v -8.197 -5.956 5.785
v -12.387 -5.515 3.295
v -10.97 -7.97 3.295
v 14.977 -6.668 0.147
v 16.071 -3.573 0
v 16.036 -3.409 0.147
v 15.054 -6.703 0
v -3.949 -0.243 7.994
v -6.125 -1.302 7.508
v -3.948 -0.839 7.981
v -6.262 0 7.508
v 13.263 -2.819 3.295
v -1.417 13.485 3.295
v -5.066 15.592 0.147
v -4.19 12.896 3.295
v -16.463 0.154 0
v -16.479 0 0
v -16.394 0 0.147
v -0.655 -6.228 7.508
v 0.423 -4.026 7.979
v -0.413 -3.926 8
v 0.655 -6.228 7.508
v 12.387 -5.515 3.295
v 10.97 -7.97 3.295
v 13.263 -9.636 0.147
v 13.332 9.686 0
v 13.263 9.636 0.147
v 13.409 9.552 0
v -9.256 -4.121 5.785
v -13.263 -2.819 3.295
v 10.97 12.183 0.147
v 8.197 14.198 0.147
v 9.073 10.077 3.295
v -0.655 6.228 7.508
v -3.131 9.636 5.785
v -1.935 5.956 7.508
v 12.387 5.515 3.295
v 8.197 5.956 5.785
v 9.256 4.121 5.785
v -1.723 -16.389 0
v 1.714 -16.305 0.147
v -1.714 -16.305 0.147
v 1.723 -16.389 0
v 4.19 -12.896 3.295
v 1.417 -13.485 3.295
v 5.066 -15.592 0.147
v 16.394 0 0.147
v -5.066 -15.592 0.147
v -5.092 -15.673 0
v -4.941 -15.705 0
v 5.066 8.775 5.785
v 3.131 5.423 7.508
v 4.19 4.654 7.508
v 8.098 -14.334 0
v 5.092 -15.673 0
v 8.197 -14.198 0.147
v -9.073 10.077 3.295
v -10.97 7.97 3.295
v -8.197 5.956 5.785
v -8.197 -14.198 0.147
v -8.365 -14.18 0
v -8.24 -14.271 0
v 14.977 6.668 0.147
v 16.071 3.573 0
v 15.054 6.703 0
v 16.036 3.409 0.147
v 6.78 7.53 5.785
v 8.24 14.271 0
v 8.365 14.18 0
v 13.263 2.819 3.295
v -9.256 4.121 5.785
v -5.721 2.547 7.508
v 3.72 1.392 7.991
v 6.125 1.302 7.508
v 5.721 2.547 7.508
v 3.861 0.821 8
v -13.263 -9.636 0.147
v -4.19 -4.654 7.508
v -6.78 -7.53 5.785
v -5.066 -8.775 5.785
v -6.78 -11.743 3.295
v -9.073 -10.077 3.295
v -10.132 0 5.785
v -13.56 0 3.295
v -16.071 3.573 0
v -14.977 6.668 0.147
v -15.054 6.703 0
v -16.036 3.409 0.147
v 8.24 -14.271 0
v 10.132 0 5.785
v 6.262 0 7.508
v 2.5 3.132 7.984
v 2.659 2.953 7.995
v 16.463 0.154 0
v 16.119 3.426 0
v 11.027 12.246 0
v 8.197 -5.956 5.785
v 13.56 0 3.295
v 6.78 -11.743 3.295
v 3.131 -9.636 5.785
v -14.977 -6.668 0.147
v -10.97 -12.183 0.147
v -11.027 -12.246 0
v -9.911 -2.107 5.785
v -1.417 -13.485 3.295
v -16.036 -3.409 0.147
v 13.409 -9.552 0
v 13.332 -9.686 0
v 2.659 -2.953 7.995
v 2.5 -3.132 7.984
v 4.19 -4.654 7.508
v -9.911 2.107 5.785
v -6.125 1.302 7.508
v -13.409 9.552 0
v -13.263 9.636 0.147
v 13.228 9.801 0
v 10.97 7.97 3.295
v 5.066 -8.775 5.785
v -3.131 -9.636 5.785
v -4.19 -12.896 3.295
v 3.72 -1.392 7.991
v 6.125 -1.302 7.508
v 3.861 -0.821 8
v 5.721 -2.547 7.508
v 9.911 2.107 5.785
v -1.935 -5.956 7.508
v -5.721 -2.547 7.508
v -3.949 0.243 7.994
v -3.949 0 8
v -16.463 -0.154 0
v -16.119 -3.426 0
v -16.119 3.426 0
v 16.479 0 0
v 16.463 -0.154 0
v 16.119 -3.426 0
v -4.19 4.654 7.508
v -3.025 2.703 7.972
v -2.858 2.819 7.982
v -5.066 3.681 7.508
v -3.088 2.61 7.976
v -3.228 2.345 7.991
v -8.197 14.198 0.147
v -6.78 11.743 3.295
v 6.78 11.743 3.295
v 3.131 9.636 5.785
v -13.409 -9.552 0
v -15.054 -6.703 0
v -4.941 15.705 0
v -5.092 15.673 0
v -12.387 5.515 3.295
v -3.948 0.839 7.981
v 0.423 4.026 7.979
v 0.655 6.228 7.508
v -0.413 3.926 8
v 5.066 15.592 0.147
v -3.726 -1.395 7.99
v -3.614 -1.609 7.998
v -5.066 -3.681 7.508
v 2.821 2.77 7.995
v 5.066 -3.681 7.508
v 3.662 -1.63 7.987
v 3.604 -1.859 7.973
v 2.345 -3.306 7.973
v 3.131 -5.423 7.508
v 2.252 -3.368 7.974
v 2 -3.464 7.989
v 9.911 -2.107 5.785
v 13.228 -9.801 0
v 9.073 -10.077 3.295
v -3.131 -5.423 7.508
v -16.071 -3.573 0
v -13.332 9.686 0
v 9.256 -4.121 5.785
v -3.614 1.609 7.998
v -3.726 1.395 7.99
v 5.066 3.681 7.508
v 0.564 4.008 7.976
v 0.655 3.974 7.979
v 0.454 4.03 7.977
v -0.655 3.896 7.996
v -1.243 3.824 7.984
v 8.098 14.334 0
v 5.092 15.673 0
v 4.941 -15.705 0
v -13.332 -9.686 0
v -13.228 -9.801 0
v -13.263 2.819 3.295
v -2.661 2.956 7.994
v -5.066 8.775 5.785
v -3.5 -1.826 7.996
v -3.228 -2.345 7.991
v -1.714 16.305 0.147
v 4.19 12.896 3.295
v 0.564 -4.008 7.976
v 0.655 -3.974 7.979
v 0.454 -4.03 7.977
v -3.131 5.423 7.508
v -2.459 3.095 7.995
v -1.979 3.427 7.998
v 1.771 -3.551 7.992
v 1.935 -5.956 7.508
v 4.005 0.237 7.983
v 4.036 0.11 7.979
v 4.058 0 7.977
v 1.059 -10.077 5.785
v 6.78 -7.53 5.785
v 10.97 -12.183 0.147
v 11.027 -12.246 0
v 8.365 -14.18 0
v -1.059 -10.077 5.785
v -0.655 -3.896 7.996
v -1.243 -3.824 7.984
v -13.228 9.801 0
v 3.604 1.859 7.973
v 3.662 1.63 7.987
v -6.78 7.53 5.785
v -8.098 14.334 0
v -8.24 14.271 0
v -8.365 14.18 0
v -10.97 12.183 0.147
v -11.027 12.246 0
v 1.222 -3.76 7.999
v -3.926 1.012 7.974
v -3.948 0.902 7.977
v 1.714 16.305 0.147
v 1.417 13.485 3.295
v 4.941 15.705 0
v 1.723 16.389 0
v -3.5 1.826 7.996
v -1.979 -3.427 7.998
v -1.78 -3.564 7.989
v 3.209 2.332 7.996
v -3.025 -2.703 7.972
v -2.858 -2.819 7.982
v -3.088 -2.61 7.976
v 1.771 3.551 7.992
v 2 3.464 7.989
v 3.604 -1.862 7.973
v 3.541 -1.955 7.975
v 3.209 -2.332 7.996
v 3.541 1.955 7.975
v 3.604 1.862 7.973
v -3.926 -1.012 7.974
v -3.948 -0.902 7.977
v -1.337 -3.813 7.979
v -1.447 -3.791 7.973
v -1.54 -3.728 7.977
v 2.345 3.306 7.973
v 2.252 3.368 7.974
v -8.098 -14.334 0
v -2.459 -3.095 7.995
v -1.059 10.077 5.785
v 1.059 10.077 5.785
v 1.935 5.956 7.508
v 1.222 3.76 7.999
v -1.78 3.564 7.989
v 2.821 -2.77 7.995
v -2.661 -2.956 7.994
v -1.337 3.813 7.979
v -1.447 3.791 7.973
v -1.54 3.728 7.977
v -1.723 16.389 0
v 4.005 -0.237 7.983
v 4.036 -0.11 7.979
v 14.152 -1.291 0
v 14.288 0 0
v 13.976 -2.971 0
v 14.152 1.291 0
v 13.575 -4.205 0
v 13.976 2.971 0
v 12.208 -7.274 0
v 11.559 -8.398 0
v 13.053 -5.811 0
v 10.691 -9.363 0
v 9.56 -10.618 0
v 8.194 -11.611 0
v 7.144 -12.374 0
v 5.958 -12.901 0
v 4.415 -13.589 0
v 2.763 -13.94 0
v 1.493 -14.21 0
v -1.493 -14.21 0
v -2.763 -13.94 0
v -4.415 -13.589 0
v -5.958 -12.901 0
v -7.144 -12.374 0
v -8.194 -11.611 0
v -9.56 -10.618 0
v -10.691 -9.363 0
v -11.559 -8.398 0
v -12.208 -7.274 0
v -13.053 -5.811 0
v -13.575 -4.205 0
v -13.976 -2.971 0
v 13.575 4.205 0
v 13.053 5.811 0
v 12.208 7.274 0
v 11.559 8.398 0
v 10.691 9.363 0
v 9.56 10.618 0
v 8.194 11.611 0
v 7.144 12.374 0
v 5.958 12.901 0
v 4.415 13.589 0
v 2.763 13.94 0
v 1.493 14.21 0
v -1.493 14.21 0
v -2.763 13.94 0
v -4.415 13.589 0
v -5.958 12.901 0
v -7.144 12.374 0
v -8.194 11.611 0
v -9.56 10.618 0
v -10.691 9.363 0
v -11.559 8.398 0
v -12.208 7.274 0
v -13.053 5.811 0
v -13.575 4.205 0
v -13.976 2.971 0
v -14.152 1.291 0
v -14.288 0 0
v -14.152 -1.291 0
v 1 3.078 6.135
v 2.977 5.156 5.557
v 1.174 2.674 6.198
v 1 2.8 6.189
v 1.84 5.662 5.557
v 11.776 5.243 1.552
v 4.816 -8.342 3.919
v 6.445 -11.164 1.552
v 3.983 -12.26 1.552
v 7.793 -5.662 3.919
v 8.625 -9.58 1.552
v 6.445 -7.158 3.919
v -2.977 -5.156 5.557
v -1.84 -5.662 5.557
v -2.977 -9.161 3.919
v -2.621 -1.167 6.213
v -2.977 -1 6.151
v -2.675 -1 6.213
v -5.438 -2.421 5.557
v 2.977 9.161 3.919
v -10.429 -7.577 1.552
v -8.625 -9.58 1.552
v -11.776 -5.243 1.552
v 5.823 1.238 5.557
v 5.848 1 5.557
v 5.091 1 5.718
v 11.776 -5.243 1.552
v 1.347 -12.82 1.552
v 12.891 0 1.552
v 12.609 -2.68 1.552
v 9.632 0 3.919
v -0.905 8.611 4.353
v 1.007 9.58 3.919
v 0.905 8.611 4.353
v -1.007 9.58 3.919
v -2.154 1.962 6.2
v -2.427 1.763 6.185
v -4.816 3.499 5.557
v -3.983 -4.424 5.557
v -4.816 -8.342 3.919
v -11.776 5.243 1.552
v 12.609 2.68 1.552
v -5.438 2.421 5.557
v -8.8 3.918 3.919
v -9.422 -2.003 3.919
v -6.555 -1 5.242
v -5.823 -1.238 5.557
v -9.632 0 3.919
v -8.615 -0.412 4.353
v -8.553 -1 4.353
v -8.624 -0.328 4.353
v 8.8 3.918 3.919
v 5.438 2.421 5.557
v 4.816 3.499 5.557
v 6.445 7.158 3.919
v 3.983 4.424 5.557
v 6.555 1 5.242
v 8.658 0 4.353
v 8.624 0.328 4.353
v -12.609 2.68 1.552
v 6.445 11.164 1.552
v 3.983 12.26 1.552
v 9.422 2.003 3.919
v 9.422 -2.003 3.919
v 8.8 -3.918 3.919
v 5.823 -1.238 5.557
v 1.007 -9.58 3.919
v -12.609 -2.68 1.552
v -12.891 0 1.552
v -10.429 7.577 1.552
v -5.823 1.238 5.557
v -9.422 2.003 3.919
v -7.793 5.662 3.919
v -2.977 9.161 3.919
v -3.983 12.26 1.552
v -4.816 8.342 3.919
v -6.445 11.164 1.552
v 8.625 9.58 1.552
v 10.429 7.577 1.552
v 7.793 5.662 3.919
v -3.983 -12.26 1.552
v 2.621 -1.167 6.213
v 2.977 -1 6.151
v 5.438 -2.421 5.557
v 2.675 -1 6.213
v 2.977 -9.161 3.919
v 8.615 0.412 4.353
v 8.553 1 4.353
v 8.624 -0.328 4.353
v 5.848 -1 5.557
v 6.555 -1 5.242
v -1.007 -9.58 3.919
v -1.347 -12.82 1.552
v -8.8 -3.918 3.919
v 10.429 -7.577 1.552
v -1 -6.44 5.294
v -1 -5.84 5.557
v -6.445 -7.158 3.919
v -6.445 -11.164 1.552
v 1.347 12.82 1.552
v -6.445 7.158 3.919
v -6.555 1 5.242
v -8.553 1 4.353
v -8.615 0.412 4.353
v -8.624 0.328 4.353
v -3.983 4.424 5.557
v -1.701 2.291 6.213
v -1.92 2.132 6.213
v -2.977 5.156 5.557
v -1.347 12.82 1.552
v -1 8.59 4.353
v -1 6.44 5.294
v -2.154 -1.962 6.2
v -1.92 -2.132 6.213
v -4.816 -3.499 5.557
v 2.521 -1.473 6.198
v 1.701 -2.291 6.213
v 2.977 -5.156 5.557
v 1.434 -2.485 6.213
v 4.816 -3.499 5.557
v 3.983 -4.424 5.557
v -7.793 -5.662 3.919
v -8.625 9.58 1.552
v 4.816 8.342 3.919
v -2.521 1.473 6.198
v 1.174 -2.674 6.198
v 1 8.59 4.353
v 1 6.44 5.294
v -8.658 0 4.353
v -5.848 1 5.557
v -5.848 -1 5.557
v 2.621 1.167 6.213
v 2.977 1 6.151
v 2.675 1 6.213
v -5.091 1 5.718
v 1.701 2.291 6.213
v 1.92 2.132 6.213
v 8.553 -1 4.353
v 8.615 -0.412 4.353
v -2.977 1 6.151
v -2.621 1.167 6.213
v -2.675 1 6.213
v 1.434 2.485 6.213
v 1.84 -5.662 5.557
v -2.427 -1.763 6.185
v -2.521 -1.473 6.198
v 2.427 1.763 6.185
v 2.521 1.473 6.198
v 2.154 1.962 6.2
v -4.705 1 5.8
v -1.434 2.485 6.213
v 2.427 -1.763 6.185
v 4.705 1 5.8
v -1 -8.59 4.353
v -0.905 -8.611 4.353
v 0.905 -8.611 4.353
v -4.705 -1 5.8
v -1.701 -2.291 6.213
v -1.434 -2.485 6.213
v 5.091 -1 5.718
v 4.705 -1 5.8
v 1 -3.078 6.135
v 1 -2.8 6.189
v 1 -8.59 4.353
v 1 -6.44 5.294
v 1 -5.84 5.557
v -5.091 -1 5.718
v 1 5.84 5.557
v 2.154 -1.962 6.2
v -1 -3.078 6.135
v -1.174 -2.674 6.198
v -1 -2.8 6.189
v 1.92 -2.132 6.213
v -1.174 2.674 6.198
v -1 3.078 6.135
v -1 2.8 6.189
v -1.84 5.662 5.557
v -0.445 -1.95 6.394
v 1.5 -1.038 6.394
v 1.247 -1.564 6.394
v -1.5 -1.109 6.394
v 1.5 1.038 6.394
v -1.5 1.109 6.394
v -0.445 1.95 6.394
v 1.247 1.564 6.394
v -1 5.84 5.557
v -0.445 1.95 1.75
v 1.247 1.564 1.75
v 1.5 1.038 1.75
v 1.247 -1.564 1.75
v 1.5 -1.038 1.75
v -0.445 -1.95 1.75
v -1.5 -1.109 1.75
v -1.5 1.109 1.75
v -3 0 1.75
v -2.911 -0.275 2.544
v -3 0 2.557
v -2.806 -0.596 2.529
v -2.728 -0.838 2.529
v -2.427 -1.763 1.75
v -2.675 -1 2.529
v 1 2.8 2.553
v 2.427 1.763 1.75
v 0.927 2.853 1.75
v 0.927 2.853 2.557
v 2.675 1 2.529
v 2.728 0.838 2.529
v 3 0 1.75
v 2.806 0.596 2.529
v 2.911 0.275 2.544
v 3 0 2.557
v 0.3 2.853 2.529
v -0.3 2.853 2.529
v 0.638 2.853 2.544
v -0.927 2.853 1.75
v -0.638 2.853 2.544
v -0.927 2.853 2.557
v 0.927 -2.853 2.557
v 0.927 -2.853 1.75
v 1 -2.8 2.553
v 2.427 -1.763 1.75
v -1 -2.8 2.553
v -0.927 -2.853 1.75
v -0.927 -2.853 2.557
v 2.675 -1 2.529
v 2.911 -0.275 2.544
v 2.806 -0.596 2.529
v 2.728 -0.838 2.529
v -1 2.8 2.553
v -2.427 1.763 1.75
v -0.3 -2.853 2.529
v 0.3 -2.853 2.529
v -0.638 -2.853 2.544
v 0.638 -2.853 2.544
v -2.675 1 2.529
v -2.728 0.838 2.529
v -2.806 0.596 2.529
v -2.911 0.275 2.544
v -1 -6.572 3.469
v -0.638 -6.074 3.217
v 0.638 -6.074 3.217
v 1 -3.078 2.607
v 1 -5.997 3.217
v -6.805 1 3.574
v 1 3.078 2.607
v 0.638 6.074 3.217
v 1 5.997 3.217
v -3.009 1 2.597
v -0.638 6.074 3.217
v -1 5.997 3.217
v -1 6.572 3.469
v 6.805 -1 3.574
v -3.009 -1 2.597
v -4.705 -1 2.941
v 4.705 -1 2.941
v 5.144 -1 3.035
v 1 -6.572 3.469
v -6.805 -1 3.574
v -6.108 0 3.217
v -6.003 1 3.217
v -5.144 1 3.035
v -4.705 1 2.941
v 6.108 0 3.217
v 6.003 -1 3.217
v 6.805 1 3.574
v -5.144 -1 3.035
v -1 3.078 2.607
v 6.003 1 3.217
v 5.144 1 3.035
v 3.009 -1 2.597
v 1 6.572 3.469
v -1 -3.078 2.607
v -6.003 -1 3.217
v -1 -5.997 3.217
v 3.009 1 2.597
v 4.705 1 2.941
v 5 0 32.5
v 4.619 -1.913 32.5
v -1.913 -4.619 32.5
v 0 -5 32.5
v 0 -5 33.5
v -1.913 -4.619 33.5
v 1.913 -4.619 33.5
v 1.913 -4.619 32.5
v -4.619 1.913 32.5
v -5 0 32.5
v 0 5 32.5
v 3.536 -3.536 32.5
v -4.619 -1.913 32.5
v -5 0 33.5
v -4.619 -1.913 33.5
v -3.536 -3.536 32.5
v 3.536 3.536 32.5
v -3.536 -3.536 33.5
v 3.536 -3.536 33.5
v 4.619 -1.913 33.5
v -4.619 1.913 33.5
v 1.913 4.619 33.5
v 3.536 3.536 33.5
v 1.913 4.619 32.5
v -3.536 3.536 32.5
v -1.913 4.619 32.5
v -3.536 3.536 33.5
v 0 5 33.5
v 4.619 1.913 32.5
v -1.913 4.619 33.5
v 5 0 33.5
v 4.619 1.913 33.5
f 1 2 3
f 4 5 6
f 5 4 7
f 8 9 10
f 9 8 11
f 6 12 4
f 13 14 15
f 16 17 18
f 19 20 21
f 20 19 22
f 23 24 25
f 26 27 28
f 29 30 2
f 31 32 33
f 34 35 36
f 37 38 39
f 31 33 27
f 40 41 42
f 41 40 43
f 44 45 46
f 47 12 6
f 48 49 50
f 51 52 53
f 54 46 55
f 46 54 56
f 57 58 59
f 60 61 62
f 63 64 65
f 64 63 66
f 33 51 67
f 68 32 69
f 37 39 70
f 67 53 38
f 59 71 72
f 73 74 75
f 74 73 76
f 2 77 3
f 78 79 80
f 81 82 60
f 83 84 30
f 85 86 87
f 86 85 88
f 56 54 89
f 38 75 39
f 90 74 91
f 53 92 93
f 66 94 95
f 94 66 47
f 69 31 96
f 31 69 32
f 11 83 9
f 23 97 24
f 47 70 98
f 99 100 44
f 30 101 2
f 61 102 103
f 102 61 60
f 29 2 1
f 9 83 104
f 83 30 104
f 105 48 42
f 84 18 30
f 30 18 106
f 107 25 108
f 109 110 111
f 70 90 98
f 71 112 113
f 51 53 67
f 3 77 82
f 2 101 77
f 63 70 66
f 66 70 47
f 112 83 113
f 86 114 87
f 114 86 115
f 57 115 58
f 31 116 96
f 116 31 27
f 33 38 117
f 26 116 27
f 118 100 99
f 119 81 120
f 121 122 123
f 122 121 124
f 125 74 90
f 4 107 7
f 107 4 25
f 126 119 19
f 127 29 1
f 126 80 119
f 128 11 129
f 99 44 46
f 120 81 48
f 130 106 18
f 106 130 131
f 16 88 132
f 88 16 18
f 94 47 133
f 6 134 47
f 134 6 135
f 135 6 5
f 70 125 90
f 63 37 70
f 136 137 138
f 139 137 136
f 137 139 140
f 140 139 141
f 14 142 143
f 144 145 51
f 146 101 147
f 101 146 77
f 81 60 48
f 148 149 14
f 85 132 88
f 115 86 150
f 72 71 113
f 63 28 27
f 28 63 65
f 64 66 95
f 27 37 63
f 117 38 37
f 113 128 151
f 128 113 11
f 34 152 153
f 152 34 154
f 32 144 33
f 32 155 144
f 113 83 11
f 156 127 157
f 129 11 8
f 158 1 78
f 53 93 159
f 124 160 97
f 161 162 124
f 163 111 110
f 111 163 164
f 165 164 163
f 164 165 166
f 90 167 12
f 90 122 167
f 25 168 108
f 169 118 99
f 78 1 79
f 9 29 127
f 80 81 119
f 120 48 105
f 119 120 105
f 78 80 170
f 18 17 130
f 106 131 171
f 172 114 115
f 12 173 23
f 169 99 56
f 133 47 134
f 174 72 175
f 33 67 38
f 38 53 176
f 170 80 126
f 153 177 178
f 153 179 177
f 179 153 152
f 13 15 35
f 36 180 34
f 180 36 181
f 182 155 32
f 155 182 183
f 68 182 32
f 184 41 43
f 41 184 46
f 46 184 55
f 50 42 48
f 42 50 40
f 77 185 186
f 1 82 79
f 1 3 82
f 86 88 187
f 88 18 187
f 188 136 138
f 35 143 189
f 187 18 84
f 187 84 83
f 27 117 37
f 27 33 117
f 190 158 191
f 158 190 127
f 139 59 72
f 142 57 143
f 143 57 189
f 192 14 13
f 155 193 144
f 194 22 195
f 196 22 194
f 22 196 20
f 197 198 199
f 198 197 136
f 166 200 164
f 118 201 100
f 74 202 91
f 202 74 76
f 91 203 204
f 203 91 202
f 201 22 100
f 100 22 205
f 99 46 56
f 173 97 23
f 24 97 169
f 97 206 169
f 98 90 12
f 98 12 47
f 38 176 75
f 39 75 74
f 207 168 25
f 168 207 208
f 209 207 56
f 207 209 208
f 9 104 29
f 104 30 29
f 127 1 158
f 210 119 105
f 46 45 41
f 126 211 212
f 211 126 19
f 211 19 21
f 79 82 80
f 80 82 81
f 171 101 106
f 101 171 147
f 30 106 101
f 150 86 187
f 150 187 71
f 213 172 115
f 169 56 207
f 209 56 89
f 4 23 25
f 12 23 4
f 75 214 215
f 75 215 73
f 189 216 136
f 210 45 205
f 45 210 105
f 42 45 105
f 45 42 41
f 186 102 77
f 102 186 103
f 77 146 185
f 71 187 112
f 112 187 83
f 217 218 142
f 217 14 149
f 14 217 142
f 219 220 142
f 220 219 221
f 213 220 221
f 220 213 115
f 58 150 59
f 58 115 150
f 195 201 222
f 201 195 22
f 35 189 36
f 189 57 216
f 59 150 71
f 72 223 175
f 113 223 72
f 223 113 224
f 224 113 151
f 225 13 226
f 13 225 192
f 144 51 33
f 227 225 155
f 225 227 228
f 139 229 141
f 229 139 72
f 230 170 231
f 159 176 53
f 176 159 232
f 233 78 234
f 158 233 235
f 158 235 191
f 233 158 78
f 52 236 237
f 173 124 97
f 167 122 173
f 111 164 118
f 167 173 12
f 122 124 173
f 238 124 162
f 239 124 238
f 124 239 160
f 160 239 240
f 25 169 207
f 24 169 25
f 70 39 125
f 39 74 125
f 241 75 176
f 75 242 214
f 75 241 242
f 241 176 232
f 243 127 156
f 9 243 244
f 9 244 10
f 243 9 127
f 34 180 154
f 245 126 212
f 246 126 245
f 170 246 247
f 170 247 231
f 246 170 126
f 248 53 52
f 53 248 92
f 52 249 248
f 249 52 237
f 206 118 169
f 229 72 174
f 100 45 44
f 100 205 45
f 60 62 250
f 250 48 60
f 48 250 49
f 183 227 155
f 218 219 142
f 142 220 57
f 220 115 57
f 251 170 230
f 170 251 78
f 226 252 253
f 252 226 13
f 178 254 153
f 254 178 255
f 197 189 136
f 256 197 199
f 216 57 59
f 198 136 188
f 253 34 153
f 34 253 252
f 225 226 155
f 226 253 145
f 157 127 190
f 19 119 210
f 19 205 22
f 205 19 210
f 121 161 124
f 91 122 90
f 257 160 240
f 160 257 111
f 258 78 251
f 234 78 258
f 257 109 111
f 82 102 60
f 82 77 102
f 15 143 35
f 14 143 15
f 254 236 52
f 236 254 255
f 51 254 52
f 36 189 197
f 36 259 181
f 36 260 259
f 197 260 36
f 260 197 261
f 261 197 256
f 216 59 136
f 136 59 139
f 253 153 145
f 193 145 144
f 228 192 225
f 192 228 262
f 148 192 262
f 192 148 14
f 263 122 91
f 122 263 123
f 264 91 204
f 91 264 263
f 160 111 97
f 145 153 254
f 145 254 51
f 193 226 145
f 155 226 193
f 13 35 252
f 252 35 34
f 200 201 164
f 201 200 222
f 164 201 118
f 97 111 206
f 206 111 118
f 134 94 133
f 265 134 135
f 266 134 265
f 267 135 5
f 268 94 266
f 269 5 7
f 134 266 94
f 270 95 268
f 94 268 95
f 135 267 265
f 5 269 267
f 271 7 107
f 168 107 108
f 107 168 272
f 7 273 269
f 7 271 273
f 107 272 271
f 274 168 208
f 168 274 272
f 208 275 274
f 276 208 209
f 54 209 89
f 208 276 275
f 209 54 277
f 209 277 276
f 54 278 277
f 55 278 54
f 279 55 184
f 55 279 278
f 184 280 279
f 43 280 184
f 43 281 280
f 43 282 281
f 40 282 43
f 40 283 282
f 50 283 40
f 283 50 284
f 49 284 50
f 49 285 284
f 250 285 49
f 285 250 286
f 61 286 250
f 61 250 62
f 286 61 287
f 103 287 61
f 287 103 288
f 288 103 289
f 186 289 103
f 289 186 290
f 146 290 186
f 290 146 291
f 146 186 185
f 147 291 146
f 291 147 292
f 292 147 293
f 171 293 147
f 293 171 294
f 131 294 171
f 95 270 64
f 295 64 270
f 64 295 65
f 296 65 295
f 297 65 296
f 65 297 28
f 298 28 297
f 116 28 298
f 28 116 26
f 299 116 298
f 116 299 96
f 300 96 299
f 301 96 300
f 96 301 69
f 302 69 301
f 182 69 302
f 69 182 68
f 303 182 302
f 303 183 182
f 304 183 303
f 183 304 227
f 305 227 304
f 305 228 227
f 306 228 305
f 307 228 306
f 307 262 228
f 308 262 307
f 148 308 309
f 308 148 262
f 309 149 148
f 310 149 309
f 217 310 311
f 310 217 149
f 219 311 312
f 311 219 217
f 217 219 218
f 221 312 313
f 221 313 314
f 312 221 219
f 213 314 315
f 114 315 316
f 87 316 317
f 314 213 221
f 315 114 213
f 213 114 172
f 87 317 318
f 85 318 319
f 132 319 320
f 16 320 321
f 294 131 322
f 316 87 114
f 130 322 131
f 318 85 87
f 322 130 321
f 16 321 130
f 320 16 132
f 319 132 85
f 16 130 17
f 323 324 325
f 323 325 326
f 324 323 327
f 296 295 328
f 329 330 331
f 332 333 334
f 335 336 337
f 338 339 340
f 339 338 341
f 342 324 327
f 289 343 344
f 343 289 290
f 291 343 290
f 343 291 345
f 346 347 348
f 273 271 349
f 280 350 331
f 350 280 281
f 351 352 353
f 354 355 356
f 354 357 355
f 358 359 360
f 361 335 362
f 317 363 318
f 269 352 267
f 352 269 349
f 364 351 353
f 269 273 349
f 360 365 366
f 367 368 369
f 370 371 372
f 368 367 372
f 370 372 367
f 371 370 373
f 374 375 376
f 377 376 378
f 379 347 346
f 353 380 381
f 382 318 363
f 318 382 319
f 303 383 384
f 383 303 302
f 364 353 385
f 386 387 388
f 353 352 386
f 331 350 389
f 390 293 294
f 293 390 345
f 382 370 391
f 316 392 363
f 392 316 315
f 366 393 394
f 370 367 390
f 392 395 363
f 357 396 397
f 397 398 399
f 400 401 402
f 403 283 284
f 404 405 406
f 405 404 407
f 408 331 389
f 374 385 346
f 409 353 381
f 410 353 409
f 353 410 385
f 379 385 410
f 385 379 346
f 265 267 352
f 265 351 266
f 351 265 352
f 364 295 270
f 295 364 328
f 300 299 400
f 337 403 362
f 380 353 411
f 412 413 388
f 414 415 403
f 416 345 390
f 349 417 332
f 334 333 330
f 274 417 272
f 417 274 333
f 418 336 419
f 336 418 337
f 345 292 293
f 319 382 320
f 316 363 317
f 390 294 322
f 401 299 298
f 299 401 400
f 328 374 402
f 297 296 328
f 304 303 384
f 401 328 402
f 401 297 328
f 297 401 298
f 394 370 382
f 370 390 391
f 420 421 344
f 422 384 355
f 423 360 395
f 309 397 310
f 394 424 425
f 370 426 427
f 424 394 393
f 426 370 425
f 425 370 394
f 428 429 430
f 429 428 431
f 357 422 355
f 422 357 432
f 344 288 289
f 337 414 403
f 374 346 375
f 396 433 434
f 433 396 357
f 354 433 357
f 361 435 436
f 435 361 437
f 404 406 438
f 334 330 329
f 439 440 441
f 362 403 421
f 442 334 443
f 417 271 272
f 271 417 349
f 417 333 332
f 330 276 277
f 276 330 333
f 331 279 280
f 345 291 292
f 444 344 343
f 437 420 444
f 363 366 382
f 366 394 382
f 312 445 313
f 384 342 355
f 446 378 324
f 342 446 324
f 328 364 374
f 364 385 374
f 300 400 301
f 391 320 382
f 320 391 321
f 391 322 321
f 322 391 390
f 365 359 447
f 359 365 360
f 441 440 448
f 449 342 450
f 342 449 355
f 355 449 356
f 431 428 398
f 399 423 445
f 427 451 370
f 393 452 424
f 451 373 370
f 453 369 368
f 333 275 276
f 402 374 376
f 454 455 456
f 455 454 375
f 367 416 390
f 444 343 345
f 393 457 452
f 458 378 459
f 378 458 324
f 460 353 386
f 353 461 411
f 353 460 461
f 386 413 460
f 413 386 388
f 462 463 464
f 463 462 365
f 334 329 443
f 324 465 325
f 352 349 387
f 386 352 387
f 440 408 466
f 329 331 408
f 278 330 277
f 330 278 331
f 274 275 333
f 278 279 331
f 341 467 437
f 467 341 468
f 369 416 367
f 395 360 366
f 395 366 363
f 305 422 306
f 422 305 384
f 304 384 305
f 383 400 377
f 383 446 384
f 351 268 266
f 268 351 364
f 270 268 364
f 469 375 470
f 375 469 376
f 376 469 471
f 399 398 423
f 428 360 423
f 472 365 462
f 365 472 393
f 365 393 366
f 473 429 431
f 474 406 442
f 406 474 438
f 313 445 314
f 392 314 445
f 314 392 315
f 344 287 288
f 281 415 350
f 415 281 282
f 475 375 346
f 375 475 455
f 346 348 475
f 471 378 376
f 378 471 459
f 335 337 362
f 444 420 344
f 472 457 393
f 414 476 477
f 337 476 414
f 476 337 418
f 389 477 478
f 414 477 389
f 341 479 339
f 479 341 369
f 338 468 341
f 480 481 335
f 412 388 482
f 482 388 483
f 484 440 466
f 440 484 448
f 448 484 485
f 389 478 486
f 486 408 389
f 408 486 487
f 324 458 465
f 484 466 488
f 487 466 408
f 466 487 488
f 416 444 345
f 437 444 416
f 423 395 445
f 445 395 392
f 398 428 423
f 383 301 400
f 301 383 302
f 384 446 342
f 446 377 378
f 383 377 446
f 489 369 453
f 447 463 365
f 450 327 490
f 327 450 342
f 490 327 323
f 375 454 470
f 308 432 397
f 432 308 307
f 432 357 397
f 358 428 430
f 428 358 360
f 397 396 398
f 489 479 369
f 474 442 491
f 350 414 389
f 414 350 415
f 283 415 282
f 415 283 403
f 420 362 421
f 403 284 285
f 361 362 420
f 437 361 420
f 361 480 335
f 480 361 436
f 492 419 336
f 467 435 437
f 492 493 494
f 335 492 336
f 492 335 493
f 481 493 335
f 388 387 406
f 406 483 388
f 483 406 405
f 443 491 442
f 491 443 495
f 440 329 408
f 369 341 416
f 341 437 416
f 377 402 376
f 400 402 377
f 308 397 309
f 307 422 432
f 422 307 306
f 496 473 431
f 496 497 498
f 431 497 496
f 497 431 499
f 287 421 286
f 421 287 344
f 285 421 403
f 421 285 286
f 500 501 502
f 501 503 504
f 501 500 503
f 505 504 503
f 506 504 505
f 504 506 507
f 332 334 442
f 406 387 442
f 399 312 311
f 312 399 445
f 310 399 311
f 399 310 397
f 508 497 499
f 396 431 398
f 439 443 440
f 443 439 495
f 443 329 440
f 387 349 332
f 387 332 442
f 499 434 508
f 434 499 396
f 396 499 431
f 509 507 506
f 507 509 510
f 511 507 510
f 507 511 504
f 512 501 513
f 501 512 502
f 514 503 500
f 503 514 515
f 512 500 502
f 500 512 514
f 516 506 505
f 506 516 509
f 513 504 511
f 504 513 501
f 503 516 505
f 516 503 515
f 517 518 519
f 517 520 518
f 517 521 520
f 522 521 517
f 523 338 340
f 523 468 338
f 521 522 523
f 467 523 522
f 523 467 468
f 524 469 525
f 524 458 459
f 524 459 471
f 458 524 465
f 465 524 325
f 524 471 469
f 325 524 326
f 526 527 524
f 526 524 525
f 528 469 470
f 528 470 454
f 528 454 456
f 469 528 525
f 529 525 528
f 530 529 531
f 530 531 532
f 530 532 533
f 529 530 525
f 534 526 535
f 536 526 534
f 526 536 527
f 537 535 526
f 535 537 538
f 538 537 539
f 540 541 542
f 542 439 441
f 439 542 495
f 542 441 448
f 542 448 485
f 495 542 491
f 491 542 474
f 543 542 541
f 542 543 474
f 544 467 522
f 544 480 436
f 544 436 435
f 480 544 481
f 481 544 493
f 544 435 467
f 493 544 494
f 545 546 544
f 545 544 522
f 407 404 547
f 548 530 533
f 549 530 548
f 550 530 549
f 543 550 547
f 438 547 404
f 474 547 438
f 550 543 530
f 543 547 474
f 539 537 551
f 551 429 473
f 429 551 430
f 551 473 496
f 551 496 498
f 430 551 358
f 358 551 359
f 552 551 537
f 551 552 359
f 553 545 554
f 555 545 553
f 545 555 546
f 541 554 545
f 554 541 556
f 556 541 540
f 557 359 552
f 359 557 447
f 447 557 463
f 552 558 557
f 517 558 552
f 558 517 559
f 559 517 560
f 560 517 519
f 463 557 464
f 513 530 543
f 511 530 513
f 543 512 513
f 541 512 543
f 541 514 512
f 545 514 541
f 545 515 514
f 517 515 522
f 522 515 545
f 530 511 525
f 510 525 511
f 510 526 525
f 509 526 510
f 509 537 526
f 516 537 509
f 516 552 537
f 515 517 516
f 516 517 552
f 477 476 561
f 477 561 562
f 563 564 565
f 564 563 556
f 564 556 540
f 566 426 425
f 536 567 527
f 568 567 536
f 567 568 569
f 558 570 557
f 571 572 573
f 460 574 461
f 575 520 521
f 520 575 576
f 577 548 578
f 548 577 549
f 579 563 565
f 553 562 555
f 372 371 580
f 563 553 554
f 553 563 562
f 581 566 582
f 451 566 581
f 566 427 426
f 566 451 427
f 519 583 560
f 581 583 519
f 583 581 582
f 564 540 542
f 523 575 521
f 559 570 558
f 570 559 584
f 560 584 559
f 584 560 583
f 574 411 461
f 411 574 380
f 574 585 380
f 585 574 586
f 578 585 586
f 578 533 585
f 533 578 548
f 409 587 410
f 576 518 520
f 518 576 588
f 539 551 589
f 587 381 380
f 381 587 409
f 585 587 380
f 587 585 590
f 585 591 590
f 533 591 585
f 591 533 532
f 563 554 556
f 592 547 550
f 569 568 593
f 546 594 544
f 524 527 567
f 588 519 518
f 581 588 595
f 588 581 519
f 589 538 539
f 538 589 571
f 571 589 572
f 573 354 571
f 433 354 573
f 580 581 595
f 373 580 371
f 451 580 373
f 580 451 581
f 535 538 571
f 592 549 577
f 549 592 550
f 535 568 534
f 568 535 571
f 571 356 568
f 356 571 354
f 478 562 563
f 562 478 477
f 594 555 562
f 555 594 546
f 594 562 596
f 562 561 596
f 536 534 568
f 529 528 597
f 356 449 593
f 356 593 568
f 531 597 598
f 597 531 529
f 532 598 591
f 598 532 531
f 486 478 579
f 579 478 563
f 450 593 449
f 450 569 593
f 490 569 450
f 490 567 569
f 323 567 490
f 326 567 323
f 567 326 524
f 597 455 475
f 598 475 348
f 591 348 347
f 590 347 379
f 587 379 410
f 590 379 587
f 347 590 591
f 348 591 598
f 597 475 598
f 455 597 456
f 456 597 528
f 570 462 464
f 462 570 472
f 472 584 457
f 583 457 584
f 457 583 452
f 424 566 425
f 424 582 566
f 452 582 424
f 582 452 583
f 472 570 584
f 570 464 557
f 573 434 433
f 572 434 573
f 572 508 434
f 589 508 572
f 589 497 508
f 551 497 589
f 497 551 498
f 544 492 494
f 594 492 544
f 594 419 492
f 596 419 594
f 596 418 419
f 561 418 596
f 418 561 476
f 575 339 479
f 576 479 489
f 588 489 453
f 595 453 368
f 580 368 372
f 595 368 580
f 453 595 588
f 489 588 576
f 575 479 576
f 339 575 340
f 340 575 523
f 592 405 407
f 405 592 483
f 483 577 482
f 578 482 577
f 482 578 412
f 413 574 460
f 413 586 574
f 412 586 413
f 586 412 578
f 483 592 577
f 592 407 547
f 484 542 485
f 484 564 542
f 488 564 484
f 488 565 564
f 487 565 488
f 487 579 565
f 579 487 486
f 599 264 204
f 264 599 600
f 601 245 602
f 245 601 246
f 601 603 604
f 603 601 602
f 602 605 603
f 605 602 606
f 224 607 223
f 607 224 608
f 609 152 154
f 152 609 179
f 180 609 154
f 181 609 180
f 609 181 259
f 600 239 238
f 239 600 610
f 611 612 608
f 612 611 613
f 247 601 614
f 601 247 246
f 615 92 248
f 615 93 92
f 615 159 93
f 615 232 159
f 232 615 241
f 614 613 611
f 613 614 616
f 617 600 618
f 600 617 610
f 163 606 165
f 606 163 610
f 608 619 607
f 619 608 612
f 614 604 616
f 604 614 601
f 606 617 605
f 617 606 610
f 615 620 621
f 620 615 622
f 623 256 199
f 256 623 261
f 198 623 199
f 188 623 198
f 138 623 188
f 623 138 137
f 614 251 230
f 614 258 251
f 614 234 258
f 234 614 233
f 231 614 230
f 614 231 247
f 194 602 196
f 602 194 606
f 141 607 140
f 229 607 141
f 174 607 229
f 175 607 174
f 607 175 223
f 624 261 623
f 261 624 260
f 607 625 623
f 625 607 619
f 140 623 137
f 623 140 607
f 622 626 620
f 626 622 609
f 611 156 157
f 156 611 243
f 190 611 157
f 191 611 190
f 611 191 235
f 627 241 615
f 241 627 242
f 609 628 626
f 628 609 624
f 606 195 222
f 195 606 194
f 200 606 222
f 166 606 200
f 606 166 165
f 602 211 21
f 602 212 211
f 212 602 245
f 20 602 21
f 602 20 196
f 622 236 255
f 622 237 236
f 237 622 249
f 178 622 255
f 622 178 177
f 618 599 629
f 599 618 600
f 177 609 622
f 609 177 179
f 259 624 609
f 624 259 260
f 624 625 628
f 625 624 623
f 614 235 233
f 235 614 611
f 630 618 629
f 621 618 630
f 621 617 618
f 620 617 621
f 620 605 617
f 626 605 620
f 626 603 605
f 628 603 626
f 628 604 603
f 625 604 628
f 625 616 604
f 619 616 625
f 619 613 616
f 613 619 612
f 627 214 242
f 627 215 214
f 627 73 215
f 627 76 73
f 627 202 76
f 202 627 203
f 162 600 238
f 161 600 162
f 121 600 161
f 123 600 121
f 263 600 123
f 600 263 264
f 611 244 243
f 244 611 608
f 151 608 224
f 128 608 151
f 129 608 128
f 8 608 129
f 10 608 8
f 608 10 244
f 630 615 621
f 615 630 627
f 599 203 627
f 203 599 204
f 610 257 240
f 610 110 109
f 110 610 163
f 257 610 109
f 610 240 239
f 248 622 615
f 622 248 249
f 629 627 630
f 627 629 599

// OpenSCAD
// [FL_INDEX: keywords="openscad, 3d_parametric, Modified_Xbox_Stick_OpenScad, csg_solid" | COT="Parametric OpenSCAD design from 3DCodeverse"]
// Title: Modified Xbox Stick OpenScad

customStick();
/*[Top of Stick]*/
stickHeight=25;
stickDiameterBottom=8;
stickDiameterTop=10;
/*[Measurement from Controller]*/
//If remove the stick from the controller, there is a hemisphere, if you set this hemisphere flat on a piece of paper this is the radius of the circle touching the paper
radiusOfCapCrossection=10;
//This is the height of the hemisphere above the paper
heightOfCap=8.5;
wallThickness=1;
pegMinorAxis=3;
pegMajorAxis=4;
pegDepth=4.75;







/*[calculation Block]*/
radiusOfSphereForStick=(radiusOfCapCrossection*radiusOfCapCrossection+heightOfCap*heightOfCap)/heightOfCap;

module customStick(){
	union(){
		difference(){
			translate([0,0,heightOfCap-radiusOfSphereForStick])sphere(radiusOfSphereForStick);
			translate([-2*radiusOfSphereForStick,-2*radiusOfSphereForStick,-2*radiusOfSphereForStick])cube([4*radiusOfSphereForStick,4*radiusOfSphereForStick,2*radiusOfSphereForStick]);
			translate([0,0,heightOfCap-wallThickness-radiusOfSphereForStick])sphere(radiusOfSphereForStick-wallThickness);
		}
		difference(){
			translate([0,0,heightOfCap-2*wallThickness-pegDepth])cylinder(r=pegMajorAxis/2+wallThickness,h=pegDepth);
			difference(){
				
				cylinder(r=pegMajorAxis/2,h=heightOfCap-wallThickness);
				translate([pegMinorAxis/2,-pegMajorAxis/2,0])cube([pegMinorAxis,pegMajorAxis,heightOfCap]);
				rotate([0,0,180])translate([pegMinorAxis/2,-pegMajorAxis/2,0])cube([pegMinorAxis,pegMajorAxis,heightOfCap]);

			}
		}
		hull(){
			translate([0,0,stickHeight+heightOfCap-wallThickness])cylinder(r=stickDiameterTop/2,h=wallThickness);
			difference(){
				cylinder(r=stickDiameterBottom/2,h=stickHeight+heightOfCap);
				translate([0,0,heightOfCap-wallThickness-radiusOfSphereForStick])sphere(radiusOfSphereForStick-.5*wallThickness);
			}
		}
		difference(){
			intersection(){
				translate([0,0,heightOfCap-wallThickness-radiusOfSphereForStick])sphere(radiusOfSphereForStick-.5*wallThickness);
translate([0,0,heightOfCap-2*wallThickness-pegDepth+radiusOfSphereForStick])sphere(radiusOfSphereForStick-.5*wallThickness);
			}
			cylinder(r=pegMajorAxis/2,h=heightOfCap-wallThickness);
			translate([wallThickness,wallThickness,0])cube(radiusOfSphereForStick);	
			rotate([0,0,90])translate([wallThickness,wallThickness,0])cube(radiusOfSphereForStick);
			rotate([0,0,180])translate([wallThickness,wallThickness,0])cube(radiusOfSphereForStick);
			rotate([0,0,270])translate([wallThickness,wallThickness,0])cube(radiusOfSphereForStick);
		}
	}
}
